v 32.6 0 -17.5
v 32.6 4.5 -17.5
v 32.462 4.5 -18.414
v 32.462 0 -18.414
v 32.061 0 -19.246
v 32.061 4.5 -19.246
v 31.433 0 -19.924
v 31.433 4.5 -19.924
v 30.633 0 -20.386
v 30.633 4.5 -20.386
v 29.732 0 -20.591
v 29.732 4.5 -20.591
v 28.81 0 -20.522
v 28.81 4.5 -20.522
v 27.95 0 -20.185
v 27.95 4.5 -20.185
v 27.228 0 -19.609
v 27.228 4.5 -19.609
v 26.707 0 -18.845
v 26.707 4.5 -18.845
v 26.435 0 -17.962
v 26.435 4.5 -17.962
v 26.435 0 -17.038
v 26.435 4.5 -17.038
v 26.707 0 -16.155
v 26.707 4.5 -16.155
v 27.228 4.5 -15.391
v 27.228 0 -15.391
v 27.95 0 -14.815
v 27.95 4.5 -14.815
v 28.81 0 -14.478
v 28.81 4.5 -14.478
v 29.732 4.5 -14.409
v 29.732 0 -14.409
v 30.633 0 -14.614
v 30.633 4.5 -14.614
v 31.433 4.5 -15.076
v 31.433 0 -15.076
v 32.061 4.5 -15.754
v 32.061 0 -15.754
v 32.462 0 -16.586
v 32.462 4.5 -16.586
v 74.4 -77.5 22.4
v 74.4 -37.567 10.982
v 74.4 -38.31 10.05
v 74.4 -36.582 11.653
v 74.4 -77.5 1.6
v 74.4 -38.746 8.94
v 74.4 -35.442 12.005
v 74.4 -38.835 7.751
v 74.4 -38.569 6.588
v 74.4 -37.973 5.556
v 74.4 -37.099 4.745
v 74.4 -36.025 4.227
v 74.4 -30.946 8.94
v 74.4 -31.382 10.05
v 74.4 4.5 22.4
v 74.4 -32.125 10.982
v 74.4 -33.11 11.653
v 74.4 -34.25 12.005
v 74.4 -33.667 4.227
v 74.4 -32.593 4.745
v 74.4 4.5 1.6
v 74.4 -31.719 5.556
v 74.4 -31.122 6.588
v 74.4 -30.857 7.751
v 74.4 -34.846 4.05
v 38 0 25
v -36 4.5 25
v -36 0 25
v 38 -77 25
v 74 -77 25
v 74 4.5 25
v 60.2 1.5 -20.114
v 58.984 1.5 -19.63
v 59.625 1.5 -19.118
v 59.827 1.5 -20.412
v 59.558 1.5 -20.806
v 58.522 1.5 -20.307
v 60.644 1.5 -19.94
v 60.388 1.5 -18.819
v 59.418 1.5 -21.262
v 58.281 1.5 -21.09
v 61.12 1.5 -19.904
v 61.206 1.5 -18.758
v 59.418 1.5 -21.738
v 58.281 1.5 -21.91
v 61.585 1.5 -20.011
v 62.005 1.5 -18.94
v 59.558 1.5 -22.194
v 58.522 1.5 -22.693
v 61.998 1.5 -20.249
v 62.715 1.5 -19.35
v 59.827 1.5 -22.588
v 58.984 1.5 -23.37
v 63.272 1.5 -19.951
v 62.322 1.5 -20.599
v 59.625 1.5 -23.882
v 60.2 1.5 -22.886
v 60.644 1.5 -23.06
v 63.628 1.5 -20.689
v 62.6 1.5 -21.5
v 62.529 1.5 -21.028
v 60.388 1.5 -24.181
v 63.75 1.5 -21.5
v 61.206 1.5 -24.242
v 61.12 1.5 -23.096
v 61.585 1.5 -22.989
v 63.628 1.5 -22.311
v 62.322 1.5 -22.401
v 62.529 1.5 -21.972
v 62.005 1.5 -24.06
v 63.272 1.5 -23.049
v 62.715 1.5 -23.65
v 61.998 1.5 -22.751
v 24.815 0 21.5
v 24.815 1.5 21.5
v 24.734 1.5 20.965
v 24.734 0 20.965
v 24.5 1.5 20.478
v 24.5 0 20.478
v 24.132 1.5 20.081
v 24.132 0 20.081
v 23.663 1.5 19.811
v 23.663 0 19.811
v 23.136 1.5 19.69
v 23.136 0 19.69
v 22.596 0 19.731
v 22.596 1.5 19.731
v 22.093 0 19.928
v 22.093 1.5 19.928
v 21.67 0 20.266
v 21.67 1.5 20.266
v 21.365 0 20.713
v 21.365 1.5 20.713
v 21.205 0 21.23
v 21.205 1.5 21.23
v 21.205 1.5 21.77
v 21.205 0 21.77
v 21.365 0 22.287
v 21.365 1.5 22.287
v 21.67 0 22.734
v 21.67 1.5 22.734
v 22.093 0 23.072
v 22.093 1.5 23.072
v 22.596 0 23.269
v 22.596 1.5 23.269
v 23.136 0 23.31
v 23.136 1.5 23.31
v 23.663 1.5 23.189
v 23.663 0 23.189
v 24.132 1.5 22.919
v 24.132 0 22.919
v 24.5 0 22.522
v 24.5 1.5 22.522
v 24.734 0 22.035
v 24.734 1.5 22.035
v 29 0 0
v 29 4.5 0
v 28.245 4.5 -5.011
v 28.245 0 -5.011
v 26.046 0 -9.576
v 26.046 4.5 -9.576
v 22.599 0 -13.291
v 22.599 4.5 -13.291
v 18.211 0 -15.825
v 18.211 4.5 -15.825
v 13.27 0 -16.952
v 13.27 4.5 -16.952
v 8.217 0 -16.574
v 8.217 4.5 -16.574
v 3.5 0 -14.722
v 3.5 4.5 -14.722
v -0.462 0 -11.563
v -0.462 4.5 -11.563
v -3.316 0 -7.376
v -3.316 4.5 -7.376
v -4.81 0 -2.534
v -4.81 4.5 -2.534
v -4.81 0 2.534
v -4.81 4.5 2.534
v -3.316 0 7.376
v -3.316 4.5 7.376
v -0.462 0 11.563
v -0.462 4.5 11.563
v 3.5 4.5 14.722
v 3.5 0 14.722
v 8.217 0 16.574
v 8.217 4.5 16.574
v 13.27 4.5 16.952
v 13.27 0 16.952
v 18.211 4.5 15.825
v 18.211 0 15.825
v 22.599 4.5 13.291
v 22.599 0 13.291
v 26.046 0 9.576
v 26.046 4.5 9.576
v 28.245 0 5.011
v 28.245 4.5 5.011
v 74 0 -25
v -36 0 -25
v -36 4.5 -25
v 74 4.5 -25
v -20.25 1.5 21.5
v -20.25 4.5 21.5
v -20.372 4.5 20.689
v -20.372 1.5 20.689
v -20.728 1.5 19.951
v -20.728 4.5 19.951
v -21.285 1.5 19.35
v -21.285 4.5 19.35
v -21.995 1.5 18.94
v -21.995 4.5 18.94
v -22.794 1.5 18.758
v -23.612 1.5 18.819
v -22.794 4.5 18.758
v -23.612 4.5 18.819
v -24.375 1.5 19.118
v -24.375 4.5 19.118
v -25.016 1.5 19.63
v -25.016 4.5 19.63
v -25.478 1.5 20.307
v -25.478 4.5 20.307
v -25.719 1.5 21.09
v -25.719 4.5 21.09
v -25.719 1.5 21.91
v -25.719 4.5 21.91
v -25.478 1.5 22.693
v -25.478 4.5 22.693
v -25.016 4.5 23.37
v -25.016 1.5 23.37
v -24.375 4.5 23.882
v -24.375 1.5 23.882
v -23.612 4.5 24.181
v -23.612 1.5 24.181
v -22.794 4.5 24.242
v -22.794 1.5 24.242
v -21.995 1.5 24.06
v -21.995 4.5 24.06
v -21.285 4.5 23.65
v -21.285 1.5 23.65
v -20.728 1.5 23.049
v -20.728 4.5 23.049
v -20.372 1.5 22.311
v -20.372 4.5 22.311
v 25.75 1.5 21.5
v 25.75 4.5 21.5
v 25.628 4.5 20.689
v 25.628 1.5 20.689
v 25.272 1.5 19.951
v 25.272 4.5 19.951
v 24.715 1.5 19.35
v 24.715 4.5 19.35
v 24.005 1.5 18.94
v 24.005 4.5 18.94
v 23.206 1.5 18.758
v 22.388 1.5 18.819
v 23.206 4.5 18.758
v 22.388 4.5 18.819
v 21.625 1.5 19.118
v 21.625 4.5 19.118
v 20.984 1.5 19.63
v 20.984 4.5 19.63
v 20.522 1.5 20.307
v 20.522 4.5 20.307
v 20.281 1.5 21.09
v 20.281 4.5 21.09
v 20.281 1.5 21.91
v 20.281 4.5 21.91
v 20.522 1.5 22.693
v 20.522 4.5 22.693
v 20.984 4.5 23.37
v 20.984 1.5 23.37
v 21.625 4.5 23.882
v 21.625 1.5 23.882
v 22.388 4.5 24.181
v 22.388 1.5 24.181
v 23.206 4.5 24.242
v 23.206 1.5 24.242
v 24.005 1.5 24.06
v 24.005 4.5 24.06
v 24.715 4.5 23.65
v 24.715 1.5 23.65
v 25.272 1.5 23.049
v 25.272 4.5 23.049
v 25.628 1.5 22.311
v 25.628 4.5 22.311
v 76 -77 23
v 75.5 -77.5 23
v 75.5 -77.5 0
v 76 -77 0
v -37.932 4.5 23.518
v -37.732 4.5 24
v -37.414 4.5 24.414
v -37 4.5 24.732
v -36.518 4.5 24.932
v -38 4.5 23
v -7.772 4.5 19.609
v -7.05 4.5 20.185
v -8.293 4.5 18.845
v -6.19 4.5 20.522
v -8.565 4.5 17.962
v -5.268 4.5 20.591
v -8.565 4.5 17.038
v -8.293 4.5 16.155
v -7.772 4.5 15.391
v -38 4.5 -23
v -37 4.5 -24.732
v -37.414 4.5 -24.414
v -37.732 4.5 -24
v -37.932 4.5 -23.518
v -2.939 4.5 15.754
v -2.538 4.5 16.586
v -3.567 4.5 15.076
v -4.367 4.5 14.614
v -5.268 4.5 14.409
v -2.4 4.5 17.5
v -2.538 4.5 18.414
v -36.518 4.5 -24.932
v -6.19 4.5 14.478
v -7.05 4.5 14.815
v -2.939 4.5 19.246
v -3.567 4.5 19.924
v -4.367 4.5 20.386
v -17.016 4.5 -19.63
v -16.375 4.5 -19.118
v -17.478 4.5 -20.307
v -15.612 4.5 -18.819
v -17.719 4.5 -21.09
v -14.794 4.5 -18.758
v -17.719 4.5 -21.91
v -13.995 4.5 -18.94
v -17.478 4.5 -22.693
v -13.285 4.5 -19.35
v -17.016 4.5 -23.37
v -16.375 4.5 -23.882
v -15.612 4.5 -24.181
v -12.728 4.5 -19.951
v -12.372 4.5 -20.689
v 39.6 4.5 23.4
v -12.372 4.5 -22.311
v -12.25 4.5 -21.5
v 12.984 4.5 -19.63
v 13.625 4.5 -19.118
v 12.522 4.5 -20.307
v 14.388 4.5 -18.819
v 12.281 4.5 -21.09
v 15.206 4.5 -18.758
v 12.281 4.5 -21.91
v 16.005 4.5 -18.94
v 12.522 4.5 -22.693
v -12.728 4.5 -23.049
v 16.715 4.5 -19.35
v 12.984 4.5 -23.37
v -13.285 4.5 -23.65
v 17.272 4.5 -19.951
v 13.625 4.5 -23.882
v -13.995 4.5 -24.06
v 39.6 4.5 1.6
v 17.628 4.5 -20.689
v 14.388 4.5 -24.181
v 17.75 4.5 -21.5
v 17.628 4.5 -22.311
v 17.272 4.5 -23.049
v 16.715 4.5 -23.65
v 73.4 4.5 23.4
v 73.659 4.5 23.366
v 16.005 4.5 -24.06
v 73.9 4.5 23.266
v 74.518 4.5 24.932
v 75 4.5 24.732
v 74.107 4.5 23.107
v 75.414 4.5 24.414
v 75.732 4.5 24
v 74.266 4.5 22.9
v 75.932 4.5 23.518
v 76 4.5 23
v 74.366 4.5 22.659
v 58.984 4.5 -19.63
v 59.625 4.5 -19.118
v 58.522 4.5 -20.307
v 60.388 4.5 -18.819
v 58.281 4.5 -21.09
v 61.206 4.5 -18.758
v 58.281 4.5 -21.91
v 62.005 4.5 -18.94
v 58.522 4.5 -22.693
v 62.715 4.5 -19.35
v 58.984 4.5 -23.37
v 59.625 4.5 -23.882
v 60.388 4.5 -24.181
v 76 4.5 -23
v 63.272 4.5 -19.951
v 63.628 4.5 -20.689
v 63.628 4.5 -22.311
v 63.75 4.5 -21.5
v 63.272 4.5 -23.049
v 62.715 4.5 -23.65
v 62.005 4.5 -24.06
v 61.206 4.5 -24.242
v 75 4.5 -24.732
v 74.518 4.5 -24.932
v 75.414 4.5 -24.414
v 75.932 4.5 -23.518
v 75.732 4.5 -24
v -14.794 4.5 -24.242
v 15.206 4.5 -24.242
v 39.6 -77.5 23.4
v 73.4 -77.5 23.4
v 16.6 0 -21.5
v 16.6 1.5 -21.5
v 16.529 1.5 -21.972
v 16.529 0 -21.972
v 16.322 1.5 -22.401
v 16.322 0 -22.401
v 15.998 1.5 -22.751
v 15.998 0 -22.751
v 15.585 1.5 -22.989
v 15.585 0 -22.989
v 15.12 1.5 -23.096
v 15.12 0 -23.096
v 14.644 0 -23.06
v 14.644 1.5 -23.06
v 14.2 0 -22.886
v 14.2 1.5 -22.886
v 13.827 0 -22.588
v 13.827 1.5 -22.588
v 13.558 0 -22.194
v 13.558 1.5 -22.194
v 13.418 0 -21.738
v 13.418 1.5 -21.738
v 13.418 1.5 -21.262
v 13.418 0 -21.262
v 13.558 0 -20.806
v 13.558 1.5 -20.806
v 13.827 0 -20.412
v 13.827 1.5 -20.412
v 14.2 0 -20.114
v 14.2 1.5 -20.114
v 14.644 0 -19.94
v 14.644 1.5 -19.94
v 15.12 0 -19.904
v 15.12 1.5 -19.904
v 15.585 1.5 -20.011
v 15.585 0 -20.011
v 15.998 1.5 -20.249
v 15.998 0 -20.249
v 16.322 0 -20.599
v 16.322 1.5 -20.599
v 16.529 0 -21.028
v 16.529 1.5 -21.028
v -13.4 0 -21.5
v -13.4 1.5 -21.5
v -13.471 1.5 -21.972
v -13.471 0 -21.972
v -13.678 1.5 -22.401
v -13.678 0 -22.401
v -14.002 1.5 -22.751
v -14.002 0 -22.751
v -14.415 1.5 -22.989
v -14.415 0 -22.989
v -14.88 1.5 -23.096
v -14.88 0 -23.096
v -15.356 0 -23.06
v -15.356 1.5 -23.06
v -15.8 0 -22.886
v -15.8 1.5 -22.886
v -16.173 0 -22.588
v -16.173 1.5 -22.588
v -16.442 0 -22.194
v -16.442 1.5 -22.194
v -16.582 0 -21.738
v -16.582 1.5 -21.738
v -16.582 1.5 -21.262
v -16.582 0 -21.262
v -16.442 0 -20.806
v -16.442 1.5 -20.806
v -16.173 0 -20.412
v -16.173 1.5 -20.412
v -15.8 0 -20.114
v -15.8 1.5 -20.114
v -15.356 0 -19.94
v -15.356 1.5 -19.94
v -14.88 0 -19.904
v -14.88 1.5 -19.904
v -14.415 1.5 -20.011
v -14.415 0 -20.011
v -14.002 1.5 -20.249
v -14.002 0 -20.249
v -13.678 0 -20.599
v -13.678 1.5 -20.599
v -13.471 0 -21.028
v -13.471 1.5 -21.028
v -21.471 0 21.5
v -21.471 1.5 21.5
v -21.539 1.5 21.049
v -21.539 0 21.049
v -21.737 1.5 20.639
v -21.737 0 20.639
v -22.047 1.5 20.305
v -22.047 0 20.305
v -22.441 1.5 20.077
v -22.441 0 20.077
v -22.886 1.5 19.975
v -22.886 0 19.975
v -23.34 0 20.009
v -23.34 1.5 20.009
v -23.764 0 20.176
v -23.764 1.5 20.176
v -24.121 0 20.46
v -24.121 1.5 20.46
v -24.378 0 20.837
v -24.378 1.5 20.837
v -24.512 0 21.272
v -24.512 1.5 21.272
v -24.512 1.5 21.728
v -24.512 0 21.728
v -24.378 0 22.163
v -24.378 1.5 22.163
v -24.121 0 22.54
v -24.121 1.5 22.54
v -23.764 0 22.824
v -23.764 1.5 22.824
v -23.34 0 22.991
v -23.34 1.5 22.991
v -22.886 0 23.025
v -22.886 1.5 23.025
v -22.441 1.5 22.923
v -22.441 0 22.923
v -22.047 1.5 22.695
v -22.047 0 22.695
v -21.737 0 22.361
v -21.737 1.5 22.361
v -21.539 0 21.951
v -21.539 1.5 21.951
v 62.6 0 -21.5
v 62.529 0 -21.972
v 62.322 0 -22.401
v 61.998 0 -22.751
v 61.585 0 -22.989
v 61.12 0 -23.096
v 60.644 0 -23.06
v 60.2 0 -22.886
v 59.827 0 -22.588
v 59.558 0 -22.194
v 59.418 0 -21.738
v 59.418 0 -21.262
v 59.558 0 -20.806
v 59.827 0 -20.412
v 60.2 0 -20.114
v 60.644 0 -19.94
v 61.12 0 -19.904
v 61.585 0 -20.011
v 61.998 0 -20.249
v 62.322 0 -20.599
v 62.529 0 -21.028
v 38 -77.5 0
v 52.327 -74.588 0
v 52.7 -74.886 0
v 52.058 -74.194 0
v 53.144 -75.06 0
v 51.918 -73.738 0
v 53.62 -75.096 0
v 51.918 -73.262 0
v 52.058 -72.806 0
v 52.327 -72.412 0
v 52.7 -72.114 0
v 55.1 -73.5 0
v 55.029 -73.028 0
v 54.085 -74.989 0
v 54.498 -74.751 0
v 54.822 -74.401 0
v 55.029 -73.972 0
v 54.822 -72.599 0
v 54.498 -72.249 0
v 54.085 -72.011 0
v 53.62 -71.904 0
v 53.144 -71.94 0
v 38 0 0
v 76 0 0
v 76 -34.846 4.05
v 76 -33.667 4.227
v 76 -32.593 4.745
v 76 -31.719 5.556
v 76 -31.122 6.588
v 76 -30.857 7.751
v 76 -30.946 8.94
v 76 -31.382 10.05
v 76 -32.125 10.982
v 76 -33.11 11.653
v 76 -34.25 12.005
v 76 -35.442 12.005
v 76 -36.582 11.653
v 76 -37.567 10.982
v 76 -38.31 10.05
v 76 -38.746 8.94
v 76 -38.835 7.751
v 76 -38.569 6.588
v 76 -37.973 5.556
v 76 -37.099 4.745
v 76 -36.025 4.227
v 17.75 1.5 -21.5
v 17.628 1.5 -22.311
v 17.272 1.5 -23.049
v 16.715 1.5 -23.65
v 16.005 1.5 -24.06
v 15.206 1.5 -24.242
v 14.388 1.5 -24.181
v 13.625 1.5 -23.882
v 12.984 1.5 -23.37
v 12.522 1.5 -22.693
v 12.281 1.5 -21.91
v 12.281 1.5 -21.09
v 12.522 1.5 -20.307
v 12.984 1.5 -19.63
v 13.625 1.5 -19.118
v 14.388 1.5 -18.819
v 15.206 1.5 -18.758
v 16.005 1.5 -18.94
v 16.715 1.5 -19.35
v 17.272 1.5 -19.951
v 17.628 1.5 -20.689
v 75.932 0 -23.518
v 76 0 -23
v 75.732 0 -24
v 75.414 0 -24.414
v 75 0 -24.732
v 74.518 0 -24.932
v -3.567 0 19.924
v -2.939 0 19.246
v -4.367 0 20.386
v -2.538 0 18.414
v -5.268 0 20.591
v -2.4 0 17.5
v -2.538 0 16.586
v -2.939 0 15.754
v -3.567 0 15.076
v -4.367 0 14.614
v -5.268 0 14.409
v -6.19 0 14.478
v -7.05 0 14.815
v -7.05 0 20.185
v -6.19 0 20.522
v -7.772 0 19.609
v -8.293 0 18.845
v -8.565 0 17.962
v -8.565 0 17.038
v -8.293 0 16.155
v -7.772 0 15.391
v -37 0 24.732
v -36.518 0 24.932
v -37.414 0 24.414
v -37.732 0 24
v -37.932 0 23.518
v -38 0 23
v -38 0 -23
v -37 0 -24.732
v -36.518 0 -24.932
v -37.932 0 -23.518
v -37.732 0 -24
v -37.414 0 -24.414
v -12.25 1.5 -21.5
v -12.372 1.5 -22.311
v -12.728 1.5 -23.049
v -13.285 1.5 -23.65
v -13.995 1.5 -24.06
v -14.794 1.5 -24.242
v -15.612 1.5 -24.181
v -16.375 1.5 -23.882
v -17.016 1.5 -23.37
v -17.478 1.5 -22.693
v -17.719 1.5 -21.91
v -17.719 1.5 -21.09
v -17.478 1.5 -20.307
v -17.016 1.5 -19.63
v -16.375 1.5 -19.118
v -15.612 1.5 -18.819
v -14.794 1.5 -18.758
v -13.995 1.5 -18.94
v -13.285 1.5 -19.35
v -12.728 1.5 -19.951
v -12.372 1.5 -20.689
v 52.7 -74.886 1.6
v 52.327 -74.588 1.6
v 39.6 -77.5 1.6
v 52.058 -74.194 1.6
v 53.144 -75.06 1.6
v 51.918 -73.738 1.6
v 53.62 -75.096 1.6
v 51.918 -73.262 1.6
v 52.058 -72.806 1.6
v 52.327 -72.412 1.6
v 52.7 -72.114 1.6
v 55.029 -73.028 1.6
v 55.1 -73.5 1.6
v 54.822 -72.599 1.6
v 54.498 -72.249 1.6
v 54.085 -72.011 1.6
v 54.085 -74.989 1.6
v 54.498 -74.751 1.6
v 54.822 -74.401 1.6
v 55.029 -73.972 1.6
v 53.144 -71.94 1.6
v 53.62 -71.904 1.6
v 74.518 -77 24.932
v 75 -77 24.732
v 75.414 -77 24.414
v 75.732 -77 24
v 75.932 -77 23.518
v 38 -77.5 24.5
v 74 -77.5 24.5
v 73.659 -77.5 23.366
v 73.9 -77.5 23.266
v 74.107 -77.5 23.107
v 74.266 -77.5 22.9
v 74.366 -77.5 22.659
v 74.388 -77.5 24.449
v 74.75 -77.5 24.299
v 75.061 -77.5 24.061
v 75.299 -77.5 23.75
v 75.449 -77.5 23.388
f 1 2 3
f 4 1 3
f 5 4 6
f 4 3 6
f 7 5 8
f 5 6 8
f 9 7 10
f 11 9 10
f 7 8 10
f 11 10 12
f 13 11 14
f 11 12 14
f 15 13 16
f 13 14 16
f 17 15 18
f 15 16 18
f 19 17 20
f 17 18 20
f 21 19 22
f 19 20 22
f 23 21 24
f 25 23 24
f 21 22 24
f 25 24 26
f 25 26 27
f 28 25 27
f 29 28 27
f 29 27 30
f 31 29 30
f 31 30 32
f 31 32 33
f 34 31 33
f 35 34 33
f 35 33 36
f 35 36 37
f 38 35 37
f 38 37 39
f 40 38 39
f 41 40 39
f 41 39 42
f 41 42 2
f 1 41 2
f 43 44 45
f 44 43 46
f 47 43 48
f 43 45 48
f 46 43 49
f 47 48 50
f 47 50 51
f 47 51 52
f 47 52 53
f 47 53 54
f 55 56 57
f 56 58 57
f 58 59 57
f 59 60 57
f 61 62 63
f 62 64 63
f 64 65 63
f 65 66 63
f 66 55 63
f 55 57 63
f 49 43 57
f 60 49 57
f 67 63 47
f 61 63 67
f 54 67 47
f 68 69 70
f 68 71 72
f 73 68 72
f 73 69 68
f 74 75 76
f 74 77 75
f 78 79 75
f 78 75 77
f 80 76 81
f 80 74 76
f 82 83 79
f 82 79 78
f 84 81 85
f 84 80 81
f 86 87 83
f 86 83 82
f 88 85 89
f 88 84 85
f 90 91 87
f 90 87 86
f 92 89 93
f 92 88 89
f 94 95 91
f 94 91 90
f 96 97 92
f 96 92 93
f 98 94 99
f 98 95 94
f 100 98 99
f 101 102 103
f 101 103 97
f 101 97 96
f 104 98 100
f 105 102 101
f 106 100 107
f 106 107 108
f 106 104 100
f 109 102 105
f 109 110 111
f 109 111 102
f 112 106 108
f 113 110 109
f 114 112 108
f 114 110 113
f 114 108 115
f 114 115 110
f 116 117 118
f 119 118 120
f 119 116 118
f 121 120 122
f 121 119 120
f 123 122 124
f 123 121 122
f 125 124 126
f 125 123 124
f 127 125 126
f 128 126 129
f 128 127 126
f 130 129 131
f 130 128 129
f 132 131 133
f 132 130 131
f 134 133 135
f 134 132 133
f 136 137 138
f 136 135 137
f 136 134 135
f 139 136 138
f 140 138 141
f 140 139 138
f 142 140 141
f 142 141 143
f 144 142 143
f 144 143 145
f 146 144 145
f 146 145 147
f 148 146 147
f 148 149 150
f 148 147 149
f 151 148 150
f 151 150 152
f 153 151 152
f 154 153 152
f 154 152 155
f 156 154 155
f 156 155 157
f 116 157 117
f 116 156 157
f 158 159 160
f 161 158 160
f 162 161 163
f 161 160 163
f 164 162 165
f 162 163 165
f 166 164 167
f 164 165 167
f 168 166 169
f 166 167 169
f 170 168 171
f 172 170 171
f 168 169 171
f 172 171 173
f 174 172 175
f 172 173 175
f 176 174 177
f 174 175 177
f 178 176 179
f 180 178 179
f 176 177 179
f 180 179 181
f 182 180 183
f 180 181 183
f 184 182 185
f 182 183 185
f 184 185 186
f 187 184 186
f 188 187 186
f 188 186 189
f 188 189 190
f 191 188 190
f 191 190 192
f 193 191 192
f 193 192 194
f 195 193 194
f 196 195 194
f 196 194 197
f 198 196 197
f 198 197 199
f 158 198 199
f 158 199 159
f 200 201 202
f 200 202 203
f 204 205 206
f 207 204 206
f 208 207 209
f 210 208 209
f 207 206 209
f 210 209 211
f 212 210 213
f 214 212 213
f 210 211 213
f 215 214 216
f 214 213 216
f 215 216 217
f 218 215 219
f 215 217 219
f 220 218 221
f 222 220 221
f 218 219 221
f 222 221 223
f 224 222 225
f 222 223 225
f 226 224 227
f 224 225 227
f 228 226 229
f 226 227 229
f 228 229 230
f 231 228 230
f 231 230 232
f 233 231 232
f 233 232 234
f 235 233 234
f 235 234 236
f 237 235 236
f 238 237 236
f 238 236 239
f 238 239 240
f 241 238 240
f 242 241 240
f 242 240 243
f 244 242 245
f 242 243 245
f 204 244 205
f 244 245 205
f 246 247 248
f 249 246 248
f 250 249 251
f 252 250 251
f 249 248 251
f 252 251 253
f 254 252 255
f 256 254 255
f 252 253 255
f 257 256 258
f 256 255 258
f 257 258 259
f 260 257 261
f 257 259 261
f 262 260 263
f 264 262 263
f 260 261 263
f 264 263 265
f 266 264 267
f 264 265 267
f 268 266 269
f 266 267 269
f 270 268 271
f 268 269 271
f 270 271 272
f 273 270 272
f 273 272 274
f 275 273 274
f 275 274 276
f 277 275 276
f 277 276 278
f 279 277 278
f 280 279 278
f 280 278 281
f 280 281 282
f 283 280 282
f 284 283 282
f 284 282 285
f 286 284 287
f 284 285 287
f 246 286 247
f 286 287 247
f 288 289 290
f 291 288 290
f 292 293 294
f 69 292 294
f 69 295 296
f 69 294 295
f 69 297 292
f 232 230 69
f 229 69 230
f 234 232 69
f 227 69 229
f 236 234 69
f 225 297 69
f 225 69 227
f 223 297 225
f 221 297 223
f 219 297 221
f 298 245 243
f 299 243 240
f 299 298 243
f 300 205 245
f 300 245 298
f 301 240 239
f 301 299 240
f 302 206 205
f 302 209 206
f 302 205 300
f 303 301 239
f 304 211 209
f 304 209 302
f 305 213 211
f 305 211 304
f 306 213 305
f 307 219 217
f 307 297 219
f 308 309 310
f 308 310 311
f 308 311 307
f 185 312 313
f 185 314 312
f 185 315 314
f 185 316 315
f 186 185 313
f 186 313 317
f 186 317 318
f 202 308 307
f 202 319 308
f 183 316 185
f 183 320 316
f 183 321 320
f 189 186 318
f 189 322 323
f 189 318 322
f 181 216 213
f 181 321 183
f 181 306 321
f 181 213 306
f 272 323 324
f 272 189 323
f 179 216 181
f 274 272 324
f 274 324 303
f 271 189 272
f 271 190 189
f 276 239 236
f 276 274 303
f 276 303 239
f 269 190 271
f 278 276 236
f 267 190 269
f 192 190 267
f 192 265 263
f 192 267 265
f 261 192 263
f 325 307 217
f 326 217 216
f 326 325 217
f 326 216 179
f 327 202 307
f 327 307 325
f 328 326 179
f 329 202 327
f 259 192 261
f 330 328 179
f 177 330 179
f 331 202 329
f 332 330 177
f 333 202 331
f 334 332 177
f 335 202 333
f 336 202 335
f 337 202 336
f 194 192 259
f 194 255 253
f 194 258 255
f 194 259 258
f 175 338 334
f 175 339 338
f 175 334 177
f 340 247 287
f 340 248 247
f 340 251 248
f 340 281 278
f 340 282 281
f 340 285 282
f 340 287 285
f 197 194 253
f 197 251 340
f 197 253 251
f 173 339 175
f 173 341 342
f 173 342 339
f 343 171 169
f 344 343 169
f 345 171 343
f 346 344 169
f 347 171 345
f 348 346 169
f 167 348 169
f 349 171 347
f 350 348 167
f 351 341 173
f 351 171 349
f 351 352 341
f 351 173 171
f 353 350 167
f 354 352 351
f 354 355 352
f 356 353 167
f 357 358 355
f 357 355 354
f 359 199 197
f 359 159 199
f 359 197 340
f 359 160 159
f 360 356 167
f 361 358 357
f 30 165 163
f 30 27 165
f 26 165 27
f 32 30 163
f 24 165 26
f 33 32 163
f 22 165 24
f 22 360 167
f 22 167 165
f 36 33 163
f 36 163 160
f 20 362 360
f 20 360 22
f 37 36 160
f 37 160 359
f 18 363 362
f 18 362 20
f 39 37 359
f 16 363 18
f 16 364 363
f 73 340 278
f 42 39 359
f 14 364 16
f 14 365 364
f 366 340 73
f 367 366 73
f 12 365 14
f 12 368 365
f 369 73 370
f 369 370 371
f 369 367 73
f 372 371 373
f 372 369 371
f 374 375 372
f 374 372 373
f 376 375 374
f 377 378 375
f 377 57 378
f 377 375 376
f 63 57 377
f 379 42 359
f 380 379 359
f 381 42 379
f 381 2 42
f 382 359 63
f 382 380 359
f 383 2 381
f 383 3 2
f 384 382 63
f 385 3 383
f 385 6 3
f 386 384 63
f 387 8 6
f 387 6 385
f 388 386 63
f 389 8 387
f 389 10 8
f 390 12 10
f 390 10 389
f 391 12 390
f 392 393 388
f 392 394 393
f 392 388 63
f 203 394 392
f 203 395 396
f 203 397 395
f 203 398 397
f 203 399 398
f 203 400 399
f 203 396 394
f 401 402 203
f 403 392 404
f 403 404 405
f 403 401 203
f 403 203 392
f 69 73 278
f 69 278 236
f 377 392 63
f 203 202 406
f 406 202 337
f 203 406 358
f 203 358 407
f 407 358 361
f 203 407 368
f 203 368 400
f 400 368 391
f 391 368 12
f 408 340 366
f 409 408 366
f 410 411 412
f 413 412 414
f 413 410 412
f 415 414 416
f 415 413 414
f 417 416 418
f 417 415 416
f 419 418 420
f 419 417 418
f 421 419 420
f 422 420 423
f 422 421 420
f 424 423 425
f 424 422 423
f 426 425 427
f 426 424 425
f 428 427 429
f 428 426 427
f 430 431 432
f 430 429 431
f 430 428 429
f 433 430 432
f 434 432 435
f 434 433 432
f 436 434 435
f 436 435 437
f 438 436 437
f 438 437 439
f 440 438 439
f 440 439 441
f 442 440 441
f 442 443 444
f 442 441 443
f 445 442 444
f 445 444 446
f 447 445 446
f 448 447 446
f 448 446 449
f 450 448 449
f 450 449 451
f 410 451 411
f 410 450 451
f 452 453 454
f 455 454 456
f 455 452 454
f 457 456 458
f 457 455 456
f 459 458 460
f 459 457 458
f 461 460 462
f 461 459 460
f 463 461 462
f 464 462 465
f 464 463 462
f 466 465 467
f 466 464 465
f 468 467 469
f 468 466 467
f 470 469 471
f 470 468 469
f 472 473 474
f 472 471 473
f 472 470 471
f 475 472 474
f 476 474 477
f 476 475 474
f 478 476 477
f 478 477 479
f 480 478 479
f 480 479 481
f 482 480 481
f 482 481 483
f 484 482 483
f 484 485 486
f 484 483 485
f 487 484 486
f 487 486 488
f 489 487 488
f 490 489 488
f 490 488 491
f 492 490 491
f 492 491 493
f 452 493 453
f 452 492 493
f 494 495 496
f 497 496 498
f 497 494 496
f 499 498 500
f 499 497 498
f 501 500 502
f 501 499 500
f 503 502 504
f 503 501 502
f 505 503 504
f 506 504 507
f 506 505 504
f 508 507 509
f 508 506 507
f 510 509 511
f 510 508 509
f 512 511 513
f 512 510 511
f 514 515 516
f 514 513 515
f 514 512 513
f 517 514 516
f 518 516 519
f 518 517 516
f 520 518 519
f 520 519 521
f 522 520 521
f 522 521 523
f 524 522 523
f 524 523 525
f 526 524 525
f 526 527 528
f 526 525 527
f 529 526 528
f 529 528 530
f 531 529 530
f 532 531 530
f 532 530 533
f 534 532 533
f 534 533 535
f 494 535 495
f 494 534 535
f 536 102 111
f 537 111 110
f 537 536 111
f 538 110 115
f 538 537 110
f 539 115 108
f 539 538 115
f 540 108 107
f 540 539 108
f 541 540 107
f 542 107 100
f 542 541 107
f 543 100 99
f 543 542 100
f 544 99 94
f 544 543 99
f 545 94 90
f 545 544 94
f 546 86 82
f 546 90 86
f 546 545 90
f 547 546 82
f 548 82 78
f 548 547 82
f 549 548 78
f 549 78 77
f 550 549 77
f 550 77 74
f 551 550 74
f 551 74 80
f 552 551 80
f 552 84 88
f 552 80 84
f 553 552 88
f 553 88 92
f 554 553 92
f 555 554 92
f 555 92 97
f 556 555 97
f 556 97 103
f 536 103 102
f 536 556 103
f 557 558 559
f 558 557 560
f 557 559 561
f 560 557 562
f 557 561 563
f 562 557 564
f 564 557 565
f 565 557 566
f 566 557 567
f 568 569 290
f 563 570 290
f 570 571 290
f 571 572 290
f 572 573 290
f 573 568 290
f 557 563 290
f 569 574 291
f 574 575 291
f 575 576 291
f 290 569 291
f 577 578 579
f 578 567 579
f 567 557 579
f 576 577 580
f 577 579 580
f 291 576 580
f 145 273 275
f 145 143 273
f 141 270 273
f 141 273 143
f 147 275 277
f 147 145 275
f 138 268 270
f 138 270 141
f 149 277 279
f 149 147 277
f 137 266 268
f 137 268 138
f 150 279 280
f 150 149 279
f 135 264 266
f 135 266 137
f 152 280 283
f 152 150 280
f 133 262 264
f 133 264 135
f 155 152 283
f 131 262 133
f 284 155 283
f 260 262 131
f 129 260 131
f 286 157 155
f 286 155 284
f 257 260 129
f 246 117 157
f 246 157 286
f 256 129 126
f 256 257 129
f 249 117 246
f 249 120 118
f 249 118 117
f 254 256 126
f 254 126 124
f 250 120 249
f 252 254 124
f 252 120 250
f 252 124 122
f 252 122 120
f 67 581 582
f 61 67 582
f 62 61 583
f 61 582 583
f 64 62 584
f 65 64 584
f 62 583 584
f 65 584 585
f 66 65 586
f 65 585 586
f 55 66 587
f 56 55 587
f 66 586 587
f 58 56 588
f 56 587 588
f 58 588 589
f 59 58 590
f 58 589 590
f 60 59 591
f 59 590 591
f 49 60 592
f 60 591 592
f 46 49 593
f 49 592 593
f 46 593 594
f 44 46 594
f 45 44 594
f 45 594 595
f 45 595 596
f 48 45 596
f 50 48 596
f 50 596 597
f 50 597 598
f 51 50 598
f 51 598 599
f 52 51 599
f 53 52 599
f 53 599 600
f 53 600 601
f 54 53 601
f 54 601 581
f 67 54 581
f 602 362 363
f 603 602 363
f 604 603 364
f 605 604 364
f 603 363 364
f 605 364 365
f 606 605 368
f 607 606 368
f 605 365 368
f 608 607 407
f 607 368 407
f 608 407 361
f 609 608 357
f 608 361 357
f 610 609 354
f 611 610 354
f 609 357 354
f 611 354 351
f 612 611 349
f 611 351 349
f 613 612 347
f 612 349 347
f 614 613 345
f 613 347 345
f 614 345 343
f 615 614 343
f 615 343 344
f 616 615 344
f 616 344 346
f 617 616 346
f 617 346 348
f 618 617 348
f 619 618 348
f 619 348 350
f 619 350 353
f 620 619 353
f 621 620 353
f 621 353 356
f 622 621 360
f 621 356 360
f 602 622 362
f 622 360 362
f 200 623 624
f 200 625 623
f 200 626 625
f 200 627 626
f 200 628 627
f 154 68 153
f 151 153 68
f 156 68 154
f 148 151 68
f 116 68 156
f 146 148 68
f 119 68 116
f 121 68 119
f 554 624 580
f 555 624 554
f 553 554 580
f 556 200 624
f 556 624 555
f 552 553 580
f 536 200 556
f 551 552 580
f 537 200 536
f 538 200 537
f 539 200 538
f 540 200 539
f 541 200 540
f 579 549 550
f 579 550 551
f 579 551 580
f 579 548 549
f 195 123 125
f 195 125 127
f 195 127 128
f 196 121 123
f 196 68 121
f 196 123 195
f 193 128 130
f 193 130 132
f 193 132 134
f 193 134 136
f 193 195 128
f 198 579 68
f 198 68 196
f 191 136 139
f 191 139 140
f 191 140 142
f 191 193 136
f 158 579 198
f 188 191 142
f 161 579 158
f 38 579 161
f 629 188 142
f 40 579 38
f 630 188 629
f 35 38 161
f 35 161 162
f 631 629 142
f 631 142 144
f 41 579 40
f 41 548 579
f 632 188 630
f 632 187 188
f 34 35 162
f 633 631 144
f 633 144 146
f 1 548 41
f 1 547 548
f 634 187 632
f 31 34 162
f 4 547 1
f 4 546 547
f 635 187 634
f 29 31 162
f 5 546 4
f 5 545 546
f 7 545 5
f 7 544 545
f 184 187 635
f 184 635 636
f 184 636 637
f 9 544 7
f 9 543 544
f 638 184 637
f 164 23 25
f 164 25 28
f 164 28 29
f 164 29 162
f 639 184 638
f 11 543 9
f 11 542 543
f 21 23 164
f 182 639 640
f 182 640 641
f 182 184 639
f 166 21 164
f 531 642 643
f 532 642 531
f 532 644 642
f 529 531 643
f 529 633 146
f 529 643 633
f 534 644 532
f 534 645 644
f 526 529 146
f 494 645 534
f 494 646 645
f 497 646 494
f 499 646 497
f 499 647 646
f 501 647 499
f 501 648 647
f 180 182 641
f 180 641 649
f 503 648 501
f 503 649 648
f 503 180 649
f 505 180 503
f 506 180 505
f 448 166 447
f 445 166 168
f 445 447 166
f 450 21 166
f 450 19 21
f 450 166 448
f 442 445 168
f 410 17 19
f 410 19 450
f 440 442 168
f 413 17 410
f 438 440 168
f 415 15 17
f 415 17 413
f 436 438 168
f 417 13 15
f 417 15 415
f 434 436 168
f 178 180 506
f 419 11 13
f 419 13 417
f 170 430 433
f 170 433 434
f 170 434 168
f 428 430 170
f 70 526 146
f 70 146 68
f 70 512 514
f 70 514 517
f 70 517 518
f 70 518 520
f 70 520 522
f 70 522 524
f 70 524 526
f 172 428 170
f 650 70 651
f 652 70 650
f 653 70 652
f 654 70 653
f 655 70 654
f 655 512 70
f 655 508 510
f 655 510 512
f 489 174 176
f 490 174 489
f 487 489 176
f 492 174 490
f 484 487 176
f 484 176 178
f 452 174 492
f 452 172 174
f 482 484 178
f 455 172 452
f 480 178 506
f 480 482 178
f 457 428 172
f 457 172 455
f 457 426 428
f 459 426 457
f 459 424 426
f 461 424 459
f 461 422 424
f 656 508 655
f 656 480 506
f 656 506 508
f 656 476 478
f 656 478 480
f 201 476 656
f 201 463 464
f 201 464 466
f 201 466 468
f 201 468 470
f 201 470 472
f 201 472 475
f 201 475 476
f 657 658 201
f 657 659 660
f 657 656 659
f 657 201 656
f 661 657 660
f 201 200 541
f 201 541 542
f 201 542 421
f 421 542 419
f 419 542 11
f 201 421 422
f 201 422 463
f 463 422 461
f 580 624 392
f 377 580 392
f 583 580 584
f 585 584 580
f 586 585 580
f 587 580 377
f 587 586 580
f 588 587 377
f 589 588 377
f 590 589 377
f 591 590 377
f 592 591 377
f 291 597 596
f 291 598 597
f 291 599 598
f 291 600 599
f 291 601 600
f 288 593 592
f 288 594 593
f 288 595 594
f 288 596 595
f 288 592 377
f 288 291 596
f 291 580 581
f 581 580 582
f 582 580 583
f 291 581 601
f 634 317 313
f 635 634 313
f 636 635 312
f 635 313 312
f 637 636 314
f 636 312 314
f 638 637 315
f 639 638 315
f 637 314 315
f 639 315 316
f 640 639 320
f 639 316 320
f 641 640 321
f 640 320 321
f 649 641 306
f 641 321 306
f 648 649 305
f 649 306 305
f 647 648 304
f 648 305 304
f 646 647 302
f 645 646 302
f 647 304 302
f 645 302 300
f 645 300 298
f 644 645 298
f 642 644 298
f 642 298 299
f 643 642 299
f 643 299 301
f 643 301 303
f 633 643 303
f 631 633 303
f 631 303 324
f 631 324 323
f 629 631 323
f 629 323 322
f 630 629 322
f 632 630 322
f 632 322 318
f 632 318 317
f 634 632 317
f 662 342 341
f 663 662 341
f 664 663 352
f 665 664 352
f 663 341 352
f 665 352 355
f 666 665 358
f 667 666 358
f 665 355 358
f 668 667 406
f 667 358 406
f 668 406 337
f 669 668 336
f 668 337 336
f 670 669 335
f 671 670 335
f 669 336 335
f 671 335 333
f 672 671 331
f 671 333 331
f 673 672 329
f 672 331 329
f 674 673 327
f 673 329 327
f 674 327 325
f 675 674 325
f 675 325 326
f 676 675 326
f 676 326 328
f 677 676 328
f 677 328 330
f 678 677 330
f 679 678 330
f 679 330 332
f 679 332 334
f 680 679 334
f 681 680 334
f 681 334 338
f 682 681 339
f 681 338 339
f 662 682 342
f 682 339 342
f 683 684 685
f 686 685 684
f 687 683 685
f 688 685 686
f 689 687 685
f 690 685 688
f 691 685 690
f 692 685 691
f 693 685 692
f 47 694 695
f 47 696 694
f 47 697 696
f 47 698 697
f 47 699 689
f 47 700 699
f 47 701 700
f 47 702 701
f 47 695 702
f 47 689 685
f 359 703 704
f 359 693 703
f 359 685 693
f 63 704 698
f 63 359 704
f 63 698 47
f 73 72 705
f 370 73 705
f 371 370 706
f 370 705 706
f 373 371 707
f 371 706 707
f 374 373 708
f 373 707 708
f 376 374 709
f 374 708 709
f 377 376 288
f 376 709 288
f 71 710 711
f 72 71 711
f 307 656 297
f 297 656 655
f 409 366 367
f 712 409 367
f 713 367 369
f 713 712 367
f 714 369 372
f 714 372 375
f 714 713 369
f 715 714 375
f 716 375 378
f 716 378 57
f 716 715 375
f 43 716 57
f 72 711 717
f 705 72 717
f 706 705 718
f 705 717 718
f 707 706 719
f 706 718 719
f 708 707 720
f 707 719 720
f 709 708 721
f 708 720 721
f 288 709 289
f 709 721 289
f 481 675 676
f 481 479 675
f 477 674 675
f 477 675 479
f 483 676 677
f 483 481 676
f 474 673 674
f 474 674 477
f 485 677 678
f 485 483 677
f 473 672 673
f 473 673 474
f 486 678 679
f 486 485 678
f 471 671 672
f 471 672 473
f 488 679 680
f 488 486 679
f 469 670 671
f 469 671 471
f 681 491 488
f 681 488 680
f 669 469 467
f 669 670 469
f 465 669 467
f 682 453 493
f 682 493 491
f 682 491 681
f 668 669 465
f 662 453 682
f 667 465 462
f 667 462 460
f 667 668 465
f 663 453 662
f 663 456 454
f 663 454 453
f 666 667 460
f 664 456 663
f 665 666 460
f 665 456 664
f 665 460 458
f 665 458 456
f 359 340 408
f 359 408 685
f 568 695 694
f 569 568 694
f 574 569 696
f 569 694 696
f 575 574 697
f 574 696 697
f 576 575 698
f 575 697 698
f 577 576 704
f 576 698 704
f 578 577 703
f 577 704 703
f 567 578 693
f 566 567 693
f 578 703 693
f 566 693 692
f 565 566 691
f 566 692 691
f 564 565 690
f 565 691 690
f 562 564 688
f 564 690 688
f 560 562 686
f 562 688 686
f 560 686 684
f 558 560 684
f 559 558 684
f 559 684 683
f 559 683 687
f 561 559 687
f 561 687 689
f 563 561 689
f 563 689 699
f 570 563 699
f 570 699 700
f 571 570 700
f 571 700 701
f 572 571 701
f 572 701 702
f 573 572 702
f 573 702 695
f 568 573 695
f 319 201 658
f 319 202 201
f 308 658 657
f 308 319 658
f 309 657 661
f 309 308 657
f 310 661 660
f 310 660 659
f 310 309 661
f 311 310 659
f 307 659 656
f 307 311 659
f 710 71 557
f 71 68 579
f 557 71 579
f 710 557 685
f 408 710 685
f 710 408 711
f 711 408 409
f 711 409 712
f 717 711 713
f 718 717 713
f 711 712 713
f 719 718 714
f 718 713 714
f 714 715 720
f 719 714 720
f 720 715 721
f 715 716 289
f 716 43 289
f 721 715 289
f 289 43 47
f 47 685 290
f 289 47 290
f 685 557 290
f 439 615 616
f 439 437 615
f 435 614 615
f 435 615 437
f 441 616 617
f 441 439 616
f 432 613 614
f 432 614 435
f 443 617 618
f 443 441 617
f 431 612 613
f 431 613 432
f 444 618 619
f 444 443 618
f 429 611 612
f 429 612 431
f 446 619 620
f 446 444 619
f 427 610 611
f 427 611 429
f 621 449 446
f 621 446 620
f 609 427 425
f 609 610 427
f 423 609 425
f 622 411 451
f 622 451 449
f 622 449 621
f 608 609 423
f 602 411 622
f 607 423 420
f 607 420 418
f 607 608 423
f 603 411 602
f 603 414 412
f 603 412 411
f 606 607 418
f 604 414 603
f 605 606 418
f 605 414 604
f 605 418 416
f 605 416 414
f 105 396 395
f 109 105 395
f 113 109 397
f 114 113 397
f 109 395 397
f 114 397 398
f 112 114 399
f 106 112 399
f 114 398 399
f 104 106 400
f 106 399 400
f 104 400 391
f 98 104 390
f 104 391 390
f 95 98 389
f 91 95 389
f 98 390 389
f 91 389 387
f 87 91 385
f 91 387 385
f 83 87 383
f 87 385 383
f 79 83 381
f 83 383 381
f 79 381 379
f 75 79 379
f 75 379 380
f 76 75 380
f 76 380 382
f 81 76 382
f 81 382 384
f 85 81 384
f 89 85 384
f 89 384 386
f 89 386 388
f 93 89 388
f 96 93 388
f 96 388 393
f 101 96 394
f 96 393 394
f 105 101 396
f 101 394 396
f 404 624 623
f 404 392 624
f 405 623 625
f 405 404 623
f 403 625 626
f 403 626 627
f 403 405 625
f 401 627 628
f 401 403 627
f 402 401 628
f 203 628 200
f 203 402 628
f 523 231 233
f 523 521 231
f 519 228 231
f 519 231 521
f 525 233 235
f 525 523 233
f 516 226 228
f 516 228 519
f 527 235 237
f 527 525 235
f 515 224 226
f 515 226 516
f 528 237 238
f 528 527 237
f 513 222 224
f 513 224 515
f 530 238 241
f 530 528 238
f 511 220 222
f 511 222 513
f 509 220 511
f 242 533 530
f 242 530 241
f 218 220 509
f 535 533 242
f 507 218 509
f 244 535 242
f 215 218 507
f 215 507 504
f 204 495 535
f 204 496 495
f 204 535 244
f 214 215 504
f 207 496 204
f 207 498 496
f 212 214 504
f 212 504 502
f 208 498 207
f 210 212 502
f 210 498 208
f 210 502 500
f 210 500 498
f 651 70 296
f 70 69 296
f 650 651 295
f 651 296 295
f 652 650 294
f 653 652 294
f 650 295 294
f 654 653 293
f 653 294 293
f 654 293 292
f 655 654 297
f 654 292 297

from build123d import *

# Parameters (mm, degrees)
CROQUIS1_R              = 1.6
CROQUIS1_R_2            = 1.528989044
CROQUIS1_R_3            = 1.814858399
SALIENTE_EXTRUIR1_DEPTH = 4.5
CROQUIS2_R              = 3.1
CROQUIS2_R_2            = 17
CORTAR_EXTRUIR1_DEPTH   = 5.5
CROQUIS3_R              = 2.75
CORTAR_EXTRUIR2_DEPTH   = 3
CROQUIS4_W              = 38
CROQUIS4_H              = 25
CROQUIS4_W_2            = 34.8
CROQUIS4_H_2            = 21.8
SALIENTE_EXTRUIR2_DEPTH = 82
CROQUIS5_R              = 1.6
CORTAR_EXTRUIR3_DEPTH   = 82
CORTAR_EXTRUIR4_REACH   = 116
CROQUIS6_R              = 4
REDONDEO1_R             = 2
REDONDEO2_R             = 1
CHAFL_N1_SIZE           = 0.5


with BuildPart() as part:
    # Croquis1 → Saliente-Extruir1 (new body)
    with BuildSketch(Plane(origin=(0, 0, 0), x_dir=(1, 0, 0), z_dir=(0, 1, 0))):
        Polygon((76, 25), (76, 0), (38, 0), (38, -25), (-38, -25), (-38, 0), (-38, 25), align=None)
        with Locations((-15, 21.5)):
            Circle(CROQUIS1_R, mode=Mode.SUBTRACT)
        with Locations((15, 21.5)):
            Circle(CROQUIS1_R, mode=Mode.SUBTRACT)
        with Locations((-23, -21.5)):
            Circle(CROQUIS1_R_2, mode=Mode.SUBTRACT)
        with Locations((23, -21.5)):
            Circle(CROQUIS1_R_3, mode=Mode.SUBTRACT)
        with Locations((61, 21.5)):
            Circle(CROQUIS1_R, mode=Mode.SUBTRACT)
    extrude(amount=SALIENTE_EXTRUIR1_DEPTH)

    # Croquis2 → Cortar-Extruir1 (cut, through all)
    with BuildSketch(Plane(origin=(0, 4.5, 0), x_dir=(1, 0, 0), z_dir=(0, 1, 0))):
        with Locations((29.5, 17.5)):
            Circle(CROQUIS2_R)
        with Locations((-5.5, -17.5)):
            Circle(CROQUIS2_R)
        with Locations((12, 0)):
            Circle(CROQUIS2_R_2)
    extrude(amount=-CORTAR_EXTRUIR1_DEPTH, mode=Mode.SUBTRACT)

    # Croquis3 → Cortar-Extruir2 (cut)
    with BuildSketch(Plane(origin=(0, 4.5, 0), x_dir=(1, 0, 0), z_dir=(0, 1, 0))):
        with Locations((-15, 21.5)):
            Circle(CROQUIS3_R)
        with Locations((15, 21.5)):
            Circle(CROQUIS3_R)
        with Locations((61, 21.5)):
            Circle(CROQUIS3_R)
        with Locations((23, -21.5)):
            Circle(CROQUIS3_R)
        with Locations((-23, -21.5)):
            Circle(CROQUIS3_R)
    extrude(amount=-CORTAR_EXTRUIR2_DEPTH, mode=Mode.SUBTRACT)

    # Croquis4 → Saliente-Extruir2 (add)
    with BuildSketch(Plane(origin=(0, 4.5, 0), x_dir=(1, 0, 0), z_dir=(0, 1, 0))):
        with Locations((57, -12.5)):
            Rectangle(CROQUIS4_W, CROQUIS4_H)
        with Locations((57, -12.5)):
            Rectangle(CROQUIS4_W_2, CROQUIS4_H_2, mode=Mode.SUBTRACT)
    extrude(amount=-SALIENTE_EXTRUIR2_DEPTH)

    # Croquis5 → Cortar-Extruir3 (cut)
    with BuildSketch(Plane.XY.offset(1.6)):
        with Locations((53.5, -73.5)):
            Circle(CROQUIS5_R)
    extrude(amount=-CORTAR_EXTRUIR3_DEPTH, mode=Mode.SUBTRACT)

    # Croquis6 → Cortar-Extruir4 (cut, up to next)
    with BuildSketch(Plane(origin=(76, 0, 0), x_dir=(0, 0, -1), z_dir=(1, 0, 0)), mode=Mode.PRIVATE) as cortar_extruir4_sk1:
        with Locations((-8.049586481, -34.845975381)):
            Circle(CROQUIS6_R)
    cortar_extruir4_tool1 = extrude(cortar_extruir4_sk1.sketch, amount=-CORTAR_EXTRUIR4_REACH, mode=Mode.PRIVATE) & part.part
    add(cortar_extruir4_tool1.solids().sort_by_distance((76, -34.845975, 8.049586))[0], mode=Mode.SUBTRACT)

    # Redondeo1
    redondeo1_edges = [part.edges().sort_by_distance(p)[0] for p in [
        (-38, 2.25, 25),
        (-38, 2.25, -25),
        (76, 2.25, -25),
        (76, -36.5, 25),
    ]]
    fillet(redondeo1_edges, radius=REDONDEO1_R)

    # Redondeo2
    redondeo2_edges = [part.edges().sort_by_distance(p)[0] for p in [
        (74.4, -36.5, 23.4),
    ]]
    fillet(redondeo2_edges, radius=REDONDEO2_R)

    # Chaflán1
    chafl_n1_edges = [part.edges().sort_by_distance(p)[0] for p in [
        (76, -77.5, 11.5),
        (75.414213562, -77.5, 24.414213562),
        (56, -77.5, 25),
    ]]
    chamfer(chafl_n1_edges, length=CHAFL_N1_SIZE)


solid = part.part
